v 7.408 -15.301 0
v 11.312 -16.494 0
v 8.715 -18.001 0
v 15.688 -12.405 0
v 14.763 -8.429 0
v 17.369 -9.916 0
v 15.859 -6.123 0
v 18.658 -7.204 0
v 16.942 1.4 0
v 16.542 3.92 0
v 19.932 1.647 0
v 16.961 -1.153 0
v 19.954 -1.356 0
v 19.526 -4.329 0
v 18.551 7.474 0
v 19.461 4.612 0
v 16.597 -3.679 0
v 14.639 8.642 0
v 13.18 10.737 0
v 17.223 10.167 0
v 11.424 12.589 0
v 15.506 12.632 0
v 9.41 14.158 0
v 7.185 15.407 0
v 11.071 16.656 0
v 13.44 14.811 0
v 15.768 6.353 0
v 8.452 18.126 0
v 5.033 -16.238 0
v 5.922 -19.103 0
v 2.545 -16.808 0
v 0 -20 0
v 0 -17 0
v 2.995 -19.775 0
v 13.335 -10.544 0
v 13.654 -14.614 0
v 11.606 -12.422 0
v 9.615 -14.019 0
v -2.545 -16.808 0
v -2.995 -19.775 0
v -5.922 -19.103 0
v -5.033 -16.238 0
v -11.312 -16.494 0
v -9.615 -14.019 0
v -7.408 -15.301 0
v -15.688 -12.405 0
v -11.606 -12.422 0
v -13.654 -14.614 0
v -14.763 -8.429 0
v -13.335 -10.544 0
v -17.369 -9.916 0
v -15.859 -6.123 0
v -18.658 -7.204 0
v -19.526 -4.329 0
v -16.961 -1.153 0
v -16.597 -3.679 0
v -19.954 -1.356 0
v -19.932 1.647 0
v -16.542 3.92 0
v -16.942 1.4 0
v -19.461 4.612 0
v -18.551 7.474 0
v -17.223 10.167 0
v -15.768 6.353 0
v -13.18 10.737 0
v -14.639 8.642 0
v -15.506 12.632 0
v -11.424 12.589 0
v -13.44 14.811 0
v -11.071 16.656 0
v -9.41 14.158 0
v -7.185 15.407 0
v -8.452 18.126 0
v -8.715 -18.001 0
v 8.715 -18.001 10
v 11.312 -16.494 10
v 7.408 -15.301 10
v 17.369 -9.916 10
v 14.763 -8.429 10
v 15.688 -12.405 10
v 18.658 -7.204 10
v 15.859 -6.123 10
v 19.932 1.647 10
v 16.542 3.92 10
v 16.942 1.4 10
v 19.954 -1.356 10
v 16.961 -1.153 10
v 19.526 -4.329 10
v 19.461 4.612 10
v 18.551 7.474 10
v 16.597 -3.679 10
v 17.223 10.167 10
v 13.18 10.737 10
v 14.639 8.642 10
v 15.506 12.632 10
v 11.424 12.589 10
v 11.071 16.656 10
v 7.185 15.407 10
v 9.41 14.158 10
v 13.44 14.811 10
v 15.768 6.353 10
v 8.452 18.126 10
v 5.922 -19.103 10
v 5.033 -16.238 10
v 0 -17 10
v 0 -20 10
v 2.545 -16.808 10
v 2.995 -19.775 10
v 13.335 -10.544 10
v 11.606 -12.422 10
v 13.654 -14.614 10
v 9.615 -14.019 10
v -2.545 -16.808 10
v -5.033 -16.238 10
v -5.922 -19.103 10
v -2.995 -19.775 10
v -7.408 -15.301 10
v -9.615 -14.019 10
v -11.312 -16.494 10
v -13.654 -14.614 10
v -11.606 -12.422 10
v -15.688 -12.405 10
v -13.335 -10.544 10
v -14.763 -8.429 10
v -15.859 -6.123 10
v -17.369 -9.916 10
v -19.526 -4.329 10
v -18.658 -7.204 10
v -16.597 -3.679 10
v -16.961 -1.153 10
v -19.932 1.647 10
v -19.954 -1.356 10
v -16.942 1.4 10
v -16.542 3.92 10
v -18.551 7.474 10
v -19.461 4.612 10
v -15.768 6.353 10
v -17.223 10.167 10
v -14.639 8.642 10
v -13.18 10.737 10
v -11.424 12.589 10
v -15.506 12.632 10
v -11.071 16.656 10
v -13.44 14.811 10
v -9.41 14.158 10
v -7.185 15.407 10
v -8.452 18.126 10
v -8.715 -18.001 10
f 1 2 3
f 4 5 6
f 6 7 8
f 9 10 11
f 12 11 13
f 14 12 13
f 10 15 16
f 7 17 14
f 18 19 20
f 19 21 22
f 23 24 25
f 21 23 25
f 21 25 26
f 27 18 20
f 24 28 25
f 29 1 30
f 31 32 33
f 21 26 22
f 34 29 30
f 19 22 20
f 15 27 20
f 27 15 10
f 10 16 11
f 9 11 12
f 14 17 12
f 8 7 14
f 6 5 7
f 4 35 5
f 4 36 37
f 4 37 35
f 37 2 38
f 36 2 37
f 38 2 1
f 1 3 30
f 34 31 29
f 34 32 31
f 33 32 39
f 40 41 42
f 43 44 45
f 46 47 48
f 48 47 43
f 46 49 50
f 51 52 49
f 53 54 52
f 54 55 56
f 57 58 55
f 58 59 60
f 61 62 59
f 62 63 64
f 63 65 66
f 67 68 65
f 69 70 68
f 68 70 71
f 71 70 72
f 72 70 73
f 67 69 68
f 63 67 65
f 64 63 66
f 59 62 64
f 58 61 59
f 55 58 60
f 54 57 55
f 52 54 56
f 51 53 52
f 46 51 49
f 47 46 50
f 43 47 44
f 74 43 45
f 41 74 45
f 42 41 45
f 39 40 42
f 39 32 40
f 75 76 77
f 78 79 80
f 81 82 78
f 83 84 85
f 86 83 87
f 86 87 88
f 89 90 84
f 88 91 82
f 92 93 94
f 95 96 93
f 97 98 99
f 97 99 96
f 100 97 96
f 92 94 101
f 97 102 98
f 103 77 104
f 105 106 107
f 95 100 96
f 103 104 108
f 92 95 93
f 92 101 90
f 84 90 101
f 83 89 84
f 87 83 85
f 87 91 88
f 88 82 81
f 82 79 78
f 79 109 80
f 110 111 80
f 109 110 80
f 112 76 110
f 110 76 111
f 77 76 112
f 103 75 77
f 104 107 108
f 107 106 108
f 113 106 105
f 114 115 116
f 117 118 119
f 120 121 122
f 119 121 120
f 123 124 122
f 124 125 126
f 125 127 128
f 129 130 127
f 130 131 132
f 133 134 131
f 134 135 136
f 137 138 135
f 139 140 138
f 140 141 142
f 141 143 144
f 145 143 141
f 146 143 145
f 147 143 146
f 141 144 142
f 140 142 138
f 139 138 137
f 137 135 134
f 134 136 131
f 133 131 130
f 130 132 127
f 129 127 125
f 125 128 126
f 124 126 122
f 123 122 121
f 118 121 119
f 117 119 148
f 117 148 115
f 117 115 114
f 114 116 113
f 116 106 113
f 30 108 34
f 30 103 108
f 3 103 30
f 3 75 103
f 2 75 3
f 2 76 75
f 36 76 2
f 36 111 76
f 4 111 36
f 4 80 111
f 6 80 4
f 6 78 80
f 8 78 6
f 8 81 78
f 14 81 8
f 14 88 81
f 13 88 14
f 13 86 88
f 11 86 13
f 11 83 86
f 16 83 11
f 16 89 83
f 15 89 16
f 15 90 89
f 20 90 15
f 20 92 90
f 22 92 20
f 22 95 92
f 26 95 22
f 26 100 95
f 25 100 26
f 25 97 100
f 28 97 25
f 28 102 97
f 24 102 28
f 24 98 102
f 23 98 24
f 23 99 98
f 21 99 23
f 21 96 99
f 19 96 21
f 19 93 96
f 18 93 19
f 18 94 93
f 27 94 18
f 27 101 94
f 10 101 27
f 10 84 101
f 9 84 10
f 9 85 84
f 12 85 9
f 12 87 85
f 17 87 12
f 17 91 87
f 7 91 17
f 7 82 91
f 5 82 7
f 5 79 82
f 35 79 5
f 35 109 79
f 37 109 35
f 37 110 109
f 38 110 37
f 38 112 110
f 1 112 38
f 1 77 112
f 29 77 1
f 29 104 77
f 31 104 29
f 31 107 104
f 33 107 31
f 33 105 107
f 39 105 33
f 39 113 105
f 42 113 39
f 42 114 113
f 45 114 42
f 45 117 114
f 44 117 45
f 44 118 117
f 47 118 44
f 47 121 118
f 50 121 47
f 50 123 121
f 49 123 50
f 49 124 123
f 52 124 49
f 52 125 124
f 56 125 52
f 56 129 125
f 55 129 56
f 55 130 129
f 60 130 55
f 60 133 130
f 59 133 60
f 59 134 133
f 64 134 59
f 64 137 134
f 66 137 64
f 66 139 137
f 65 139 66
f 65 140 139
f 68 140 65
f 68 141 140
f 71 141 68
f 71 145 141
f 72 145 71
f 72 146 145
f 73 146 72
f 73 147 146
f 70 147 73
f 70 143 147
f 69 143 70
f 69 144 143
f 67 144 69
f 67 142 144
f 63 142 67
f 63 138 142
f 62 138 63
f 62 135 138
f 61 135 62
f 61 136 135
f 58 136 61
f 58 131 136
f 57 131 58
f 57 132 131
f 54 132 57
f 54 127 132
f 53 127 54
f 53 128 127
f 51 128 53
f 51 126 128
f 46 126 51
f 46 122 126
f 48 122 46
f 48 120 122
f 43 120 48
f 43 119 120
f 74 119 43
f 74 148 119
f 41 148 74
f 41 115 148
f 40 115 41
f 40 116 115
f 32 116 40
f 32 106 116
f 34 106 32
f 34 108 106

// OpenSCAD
$fn = 32;

// ----------------------------------------------------------------------
// Spring clip: 40 mm outside, 3 mm band, 50 degree opening
// ----------------------------------------------------------------------

// --- parameters (mm) ---
outer_r = 20;             // clip outside radius
inner_r = 17;             // clip bore radius
band = 3;                 // band thickness
clip_w = 10;              // clip width
opening = 50;             // opening angle

clip_profile = [[-8.452, 18.126], [-11.071, 16.656], [-13.44, 14.811], [-15.506, 12.632], [-17.223, 10.167], [-18.551, 7.474], [-19.461, 4.612], [-19.932, 1.647], [-19.954, -1.356], [-19.526, -4.329], [-18.658, -7.204], [-17.369, -9.916], [-15.688, -12.405], [-13.654, -14.614], [-11.312, -16.494], [-8.715, -18.001], [-5.922, -19.103], [-2.995, -19.775], [0, -20], [2.995, -19.775], [5.922, -19.103], [8.715, -18.001], [11.312, -16.494], [13.654, -14.614], [15.688, -12.405], [17.369, -9.916], [18.658, -7.204], [19.526, -4.329], [19.954, -1.356], [19.932, 1.647], [19.461, 4.612], [18.551, 7.474], [17.223, 10.167], [15.506, 12.632], [13.44, 14.811], [11.071, 16.656], [8.452, 18.126], [7.185, 15.407], [9.41, 14.158], [11.424, 12.589], [13.18, 10.737], [14.639, 8.642], [15.768, 6.353], [16.542, 3.92], [16.942, 1.4], [16.961, -1.153], [16.597, -3.679], [15.859, -6.123], [14.763, -8.429], [13.335, -10.544], [11.606, -12.422], [9.615, -14.019], [7.408, -15.301], [5.033, -16.238], [2.545, -16.808], [0, -17], [-2.545, -16.808], [-5.033, -16.238], [-7.408, -15.301], [-9.615, -14.019], [-11.606, -12.422], [-13.335, -10.544], [-14.763, -8.429], [-15.859, -6.123], [-16.597, -3.679], [-16.961, -1.153], [-16.942, 1.4], [-16.542, 3.92], [-15.768, 6.353], [-14.639, 8.642], [-13.18, 10.737], [-11.424, 12.589], [-9.41, 14.158], [-7.185, 15.407]];

difference() {
  union() {
    linear_extrude(height = clip_w) polygon(clip_profile);
  }
}
